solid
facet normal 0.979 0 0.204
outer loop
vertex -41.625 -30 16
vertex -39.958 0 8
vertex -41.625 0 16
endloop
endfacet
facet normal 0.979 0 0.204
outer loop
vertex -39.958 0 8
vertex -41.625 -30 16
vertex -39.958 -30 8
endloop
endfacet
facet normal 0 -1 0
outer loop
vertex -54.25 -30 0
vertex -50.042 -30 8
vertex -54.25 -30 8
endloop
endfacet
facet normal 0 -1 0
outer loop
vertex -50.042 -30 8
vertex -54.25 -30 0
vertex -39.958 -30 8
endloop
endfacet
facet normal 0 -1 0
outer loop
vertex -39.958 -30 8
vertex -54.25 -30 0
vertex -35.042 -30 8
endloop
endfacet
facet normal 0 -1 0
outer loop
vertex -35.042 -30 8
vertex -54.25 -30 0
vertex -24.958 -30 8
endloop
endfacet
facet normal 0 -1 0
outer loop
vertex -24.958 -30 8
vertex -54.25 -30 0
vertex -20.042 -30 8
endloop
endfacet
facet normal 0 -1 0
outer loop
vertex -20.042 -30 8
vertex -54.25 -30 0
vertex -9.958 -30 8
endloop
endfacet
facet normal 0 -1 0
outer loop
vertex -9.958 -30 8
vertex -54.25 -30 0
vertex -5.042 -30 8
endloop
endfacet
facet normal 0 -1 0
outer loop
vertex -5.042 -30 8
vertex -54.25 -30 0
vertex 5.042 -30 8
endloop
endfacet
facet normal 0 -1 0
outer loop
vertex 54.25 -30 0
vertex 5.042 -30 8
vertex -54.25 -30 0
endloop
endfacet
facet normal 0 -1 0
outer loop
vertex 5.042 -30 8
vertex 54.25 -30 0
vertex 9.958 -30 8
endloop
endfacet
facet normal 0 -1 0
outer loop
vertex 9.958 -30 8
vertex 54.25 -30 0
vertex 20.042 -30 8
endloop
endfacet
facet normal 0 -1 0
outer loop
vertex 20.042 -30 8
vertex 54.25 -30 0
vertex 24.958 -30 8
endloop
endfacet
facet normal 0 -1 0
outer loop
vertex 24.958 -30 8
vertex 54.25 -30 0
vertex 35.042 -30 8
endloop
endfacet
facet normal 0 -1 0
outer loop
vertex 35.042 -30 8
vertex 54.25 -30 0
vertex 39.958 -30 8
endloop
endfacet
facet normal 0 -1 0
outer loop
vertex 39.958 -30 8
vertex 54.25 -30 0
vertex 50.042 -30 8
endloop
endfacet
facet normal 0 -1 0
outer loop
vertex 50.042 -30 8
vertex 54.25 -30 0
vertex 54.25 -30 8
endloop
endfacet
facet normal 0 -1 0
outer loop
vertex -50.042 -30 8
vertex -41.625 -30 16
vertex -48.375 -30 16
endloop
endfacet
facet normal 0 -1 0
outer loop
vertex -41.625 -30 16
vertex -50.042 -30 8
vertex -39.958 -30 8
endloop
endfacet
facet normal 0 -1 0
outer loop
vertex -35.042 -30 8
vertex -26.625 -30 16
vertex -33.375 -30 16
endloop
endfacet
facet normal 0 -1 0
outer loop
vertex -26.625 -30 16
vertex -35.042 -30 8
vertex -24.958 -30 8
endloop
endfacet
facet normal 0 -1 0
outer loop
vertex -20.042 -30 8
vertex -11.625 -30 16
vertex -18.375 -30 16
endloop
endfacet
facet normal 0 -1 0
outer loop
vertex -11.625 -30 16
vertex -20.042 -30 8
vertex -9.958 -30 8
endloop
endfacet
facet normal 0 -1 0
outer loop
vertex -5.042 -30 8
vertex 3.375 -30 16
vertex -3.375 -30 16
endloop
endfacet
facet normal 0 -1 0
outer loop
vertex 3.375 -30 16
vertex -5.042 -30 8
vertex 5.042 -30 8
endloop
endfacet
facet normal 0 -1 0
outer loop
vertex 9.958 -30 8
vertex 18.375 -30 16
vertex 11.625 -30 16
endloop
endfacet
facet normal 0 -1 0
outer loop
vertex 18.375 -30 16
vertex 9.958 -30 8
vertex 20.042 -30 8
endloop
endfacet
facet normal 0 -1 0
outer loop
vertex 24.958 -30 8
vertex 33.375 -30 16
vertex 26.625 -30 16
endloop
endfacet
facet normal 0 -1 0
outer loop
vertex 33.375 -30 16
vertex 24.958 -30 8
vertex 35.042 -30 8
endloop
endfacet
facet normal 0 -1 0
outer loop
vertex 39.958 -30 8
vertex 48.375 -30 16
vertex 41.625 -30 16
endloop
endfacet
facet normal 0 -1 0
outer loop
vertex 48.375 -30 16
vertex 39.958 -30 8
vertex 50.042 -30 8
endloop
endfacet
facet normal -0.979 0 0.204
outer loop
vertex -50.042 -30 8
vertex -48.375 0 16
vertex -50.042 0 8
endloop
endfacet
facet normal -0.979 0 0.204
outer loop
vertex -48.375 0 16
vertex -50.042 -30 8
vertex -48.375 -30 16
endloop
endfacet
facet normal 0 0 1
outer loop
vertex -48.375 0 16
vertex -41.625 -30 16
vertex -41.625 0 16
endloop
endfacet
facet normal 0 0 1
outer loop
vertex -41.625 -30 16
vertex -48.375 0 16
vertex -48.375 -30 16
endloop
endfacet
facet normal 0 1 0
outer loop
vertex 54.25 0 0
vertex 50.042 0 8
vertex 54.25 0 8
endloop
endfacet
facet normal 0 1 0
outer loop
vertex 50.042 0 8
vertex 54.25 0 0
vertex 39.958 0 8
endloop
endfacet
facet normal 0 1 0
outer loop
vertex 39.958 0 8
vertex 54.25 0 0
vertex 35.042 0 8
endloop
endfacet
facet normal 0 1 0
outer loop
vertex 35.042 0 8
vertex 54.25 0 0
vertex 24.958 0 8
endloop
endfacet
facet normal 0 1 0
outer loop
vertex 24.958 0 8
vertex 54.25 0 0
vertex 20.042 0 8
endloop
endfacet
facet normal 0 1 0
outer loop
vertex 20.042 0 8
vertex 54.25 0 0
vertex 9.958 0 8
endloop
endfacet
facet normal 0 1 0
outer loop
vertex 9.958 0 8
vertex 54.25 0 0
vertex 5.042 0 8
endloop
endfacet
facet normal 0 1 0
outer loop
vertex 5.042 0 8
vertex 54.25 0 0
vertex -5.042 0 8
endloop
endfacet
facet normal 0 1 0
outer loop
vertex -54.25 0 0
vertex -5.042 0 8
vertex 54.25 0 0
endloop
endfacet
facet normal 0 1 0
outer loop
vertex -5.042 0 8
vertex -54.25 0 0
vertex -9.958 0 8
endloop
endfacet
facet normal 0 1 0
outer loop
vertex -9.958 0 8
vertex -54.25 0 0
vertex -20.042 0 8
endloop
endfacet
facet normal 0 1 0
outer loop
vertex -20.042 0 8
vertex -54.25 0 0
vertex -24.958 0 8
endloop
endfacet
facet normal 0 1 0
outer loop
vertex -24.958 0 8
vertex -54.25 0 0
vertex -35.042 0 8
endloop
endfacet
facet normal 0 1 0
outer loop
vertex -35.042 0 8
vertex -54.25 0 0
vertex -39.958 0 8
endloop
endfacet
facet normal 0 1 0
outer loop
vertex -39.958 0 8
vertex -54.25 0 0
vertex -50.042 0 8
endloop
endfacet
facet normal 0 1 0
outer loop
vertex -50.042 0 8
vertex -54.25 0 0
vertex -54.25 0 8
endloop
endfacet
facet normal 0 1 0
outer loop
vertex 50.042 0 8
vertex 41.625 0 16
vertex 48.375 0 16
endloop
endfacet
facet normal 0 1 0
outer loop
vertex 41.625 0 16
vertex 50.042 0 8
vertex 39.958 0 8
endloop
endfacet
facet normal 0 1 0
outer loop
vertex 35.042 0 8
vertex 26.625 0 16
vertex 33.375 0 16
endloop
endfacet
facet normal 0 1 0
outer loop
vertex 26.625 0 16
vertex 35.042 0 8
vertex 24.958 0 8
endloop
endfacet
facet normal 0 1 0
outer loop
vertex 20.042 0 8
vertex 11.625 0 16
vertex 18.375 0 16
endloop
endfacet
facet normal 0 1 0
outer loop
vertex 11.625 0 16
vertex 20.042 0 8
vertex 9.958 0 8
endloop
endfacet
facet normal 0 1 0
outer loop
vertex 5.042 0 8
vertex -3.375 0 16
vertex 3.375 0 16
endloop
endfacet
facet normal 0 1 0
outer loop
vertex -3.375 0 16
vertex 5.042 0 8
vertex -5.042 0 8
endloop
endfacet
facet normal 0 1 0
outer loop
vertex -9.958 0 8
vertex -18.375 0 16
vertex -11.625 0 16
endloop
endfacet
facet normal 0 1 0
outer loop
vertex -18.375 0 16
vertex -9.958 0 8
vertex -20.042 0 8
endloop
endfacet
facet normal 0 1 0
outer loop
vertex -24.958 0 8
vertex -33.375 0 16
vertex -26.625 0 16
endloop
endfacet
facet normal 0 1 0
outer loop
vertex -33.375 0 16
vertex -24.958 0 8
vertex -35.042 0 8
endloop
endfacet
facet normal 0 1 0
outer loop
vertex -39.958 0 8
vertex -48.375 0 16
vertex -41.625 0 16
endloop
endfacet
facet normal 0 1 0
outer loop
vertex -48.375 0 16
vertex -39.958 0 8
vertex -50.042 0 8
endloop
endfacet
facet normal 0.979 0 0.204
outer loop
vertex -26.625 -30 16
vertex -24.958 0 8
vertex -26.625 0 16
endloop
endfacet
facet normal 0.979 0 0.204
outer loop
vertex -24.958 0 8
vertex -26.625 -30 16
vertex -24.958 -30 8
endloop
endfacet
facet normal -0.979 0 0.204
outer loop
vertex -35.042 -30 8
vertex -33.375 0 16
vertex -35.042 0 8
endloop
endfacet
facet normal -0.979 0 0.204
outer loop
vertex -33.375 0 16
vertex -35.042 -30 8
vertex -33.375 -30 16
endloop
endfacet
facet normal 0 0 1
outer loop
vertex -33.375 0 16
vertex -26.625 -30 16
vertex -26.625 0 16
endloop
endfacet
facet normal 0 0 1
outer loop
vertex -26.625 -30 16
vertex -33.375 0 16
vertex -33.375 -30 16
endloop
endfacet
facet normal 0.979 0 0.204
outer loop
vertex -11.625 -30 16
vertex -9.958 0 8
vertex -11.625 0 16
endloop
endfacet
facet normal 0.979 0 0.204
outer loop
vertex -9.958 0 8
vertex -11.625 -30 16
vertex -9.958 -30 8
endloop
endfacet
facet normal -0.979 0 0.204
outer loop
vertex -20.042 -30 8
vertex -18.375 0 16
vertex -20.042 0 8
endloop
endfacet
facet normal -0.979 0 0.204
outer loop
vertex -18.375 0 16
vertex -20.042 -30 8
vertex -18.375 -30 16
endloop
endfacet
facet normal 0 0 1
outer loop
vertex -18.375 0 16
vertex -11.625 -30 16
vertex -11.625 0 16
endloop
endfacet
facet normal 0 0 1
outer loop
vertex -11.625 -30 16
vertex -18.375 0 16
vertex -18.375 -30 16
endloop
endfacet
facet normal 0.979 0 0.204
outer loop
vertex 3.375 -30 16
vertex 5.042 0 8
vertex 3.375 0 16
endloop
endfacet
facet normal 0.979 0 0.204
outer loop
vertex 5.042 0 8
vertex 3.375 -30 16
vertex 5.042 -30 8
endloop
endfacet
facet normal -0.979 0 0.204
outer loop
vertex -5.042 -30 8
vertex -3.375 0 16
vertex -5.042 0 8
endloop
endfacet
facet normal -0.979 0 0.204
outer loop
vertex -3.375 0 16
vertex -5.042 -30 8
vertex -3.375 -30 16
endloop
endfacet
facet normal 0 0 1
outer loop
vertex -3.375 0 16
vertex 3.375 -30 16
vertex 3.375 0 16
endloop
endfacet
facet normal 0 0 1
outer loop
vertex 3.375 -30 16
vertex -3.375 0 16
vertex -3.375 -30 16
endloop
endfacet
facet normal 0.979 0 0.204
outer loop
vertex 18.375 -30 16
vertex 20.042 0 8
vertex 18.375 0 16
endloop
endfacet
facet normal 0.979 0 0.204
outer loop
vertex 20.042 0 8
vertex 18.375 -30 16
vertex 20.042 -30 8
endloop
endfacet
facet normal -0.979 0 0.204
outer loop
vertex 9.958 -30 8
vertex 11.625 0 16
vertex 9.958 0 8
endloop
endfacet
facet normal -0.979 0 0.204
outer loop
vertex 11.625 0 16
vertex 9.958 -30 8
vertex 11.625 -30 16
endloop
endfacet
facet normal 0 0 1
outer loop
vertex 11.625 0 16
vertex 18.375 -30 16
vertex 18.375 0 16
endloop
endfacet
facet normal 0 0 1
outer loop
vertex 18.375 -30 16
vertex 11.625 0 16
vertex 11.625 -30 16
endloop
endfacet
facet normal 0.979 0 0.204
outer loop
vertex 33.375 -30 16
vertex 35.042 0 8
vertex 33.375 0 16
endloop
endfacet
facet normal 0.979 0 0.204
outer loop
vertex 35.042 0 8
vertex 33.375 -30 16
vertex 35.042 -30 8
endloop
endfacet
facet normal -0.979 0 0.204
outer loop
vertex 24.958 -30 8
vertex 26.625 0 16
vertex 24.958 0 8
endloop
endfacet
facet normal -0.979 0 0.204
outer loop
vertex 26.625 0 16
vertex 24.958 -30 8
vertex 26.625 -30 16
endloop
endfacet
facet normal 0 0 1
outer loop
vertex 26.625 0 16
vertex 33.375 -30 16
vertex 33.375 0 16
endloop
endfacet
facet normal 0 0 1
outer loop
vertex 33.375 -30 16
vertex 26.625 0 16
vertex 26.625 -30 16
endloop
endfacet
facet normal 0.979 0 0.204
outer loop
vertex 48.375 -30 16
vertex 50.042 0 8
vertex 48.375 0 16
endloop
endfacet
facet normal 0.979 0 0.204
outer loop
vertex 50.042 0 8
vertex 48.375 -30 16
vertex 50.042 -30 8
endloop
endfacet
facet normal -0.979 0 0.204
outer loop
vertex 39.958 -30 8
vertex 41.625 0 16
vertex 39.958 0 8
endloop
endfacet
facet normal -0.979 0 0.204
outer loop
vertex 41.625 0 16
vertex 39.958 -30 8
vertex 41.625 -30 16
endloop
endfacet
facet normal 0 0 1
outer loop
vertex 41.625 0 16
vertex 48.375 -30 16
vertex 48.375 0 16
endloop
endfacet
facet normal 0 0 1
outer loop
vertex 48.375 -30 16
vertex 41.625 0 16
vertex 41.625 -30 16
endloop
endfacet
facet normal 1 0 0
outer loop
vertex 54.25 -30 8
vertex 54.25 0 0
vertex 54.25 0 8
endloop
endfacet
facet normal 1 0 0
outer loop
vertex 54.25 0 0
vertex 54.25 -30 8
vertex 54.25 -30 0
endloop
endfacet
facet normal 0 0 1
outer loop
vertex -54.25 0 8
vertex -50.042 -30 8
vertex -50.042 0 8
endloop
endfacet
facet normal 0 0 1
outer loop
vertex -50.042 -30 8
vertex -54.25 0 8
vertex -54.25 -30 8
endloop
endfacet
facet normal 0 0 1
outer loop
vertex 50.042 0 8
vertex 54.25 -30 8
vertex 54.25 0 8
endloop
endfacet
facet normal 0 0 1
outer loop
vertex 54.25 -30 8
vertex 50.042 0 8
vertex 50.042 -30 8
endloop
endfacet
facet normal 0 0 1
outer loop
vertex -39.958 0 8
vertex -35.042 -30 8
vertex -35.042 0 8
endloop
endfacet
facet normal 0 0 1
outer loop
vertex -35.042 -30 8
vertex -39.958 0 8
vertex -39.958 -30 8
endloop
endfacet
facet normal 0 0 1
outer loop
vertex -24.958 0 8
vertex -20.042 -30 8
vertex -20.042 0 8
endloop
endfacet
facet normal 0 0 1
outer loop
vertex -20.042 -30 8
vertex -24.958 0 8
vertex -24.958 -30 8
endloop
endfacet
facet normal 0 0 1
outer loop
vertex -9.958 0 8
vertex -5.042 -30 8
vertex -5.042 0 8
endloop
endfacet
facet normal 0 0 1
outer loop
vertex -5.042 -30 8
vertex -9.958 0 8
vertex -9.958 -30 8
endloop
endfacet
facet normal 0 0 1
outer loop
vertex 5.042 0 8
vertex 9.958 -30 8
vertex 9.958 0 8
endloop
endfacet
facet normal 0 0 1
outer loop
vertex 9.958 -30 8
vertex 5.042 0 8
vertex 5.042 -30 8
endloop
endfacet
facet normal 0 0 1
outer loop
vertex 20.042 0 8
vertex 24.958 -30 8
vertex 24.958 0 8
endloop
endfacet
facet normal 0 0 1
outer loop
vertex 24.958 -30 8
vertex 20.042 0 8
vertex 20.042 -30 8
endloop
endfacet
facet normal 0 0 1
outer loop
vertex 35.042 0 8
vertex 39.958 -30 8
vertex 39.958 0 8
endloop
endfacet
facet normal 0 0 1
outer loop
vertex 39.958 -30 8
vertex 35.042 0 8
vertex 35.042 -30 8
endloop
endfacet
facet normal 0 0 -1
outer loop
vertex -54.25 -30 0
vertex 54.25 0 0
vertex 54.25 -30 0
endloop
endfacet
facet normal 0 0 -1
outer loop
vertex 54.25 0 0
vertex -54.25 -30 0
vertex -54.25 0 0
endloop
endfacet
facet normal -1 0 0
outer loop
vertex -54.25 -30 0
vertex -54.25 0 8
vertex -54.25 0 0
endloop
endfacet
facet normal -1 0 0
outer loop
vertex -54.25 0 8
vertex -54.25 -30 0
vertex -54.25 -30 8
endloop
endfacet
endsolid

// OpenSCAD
$fn = 32;

// ----------------------------------------------------------------------
// Toothed rack, 7 teeth
// 15 mm pitch, 8 mm teeth
// ----------------------------------------------------------------------

// --- parameters (mm) ---
bar_w = 30;      // bar width (Y)
bar_h = 8;       // bar height (Z)
teeth = 7;       // number of teeth
pitch = 15;      // tooth pitch
tooth_h = 8;     // tooth height above the bar
root_w = 10.5;   // tooth width at the root
crest_w = 6.75;  // tooth width at the crest

// --- derived feature positions (mm) ---
span = (teeth - 1) * pitch;  // = 90   distance between the outer teeth
bar_l = span + root_w + 8;   // = 108.5   bar length: teeth plus 4 mm at each end
tooth_x = -span / 2;         // = -45   X of the first tooth
height = bar_h + tooth_h;    // = 16   overall height
feature_centers = [
  [tooth_x + 0 * pitch, -bar_w / 2],
  [tooth_x + 1 * pitch, -bar_w / 2],
  [tooth_x + 2 * pitch, -bar_w / 2],
  [tooth_x + 3 * pitch, -bar_w / 2],
  [tooth_x + 4 * pitch, -bar_w / 2],
  [tooth_x + 5 * pitch, -bar_w / 2],
  [tooth_x + 6 * pitch, -bar_w / 2]
];   // tooth centre line, drives the tooth loop

// bar with a rack of teeth, one extruded trapezoium per centre
module rack_tooth() {
  linear_extrude(height = bar_w)
    polygon(points = [
      [0, 0],
      [root_w, 0],
      [root_w / 2 + crest_w / 2, tooth_h + 1],
      [root_w / 2 - crest_w / 2, tooth_h + 1]
    ]);
}

union() {
  translate([-bar_l / 2, -bar_w, 0]) cube([bar_l, bar_w, bar_h]);
  for (centre = feature_centers)
    translate([centre[0] - root_w / 2, 0, bar_h - 1]) rotate([90, 0, 0]) rack_tooth();
}
